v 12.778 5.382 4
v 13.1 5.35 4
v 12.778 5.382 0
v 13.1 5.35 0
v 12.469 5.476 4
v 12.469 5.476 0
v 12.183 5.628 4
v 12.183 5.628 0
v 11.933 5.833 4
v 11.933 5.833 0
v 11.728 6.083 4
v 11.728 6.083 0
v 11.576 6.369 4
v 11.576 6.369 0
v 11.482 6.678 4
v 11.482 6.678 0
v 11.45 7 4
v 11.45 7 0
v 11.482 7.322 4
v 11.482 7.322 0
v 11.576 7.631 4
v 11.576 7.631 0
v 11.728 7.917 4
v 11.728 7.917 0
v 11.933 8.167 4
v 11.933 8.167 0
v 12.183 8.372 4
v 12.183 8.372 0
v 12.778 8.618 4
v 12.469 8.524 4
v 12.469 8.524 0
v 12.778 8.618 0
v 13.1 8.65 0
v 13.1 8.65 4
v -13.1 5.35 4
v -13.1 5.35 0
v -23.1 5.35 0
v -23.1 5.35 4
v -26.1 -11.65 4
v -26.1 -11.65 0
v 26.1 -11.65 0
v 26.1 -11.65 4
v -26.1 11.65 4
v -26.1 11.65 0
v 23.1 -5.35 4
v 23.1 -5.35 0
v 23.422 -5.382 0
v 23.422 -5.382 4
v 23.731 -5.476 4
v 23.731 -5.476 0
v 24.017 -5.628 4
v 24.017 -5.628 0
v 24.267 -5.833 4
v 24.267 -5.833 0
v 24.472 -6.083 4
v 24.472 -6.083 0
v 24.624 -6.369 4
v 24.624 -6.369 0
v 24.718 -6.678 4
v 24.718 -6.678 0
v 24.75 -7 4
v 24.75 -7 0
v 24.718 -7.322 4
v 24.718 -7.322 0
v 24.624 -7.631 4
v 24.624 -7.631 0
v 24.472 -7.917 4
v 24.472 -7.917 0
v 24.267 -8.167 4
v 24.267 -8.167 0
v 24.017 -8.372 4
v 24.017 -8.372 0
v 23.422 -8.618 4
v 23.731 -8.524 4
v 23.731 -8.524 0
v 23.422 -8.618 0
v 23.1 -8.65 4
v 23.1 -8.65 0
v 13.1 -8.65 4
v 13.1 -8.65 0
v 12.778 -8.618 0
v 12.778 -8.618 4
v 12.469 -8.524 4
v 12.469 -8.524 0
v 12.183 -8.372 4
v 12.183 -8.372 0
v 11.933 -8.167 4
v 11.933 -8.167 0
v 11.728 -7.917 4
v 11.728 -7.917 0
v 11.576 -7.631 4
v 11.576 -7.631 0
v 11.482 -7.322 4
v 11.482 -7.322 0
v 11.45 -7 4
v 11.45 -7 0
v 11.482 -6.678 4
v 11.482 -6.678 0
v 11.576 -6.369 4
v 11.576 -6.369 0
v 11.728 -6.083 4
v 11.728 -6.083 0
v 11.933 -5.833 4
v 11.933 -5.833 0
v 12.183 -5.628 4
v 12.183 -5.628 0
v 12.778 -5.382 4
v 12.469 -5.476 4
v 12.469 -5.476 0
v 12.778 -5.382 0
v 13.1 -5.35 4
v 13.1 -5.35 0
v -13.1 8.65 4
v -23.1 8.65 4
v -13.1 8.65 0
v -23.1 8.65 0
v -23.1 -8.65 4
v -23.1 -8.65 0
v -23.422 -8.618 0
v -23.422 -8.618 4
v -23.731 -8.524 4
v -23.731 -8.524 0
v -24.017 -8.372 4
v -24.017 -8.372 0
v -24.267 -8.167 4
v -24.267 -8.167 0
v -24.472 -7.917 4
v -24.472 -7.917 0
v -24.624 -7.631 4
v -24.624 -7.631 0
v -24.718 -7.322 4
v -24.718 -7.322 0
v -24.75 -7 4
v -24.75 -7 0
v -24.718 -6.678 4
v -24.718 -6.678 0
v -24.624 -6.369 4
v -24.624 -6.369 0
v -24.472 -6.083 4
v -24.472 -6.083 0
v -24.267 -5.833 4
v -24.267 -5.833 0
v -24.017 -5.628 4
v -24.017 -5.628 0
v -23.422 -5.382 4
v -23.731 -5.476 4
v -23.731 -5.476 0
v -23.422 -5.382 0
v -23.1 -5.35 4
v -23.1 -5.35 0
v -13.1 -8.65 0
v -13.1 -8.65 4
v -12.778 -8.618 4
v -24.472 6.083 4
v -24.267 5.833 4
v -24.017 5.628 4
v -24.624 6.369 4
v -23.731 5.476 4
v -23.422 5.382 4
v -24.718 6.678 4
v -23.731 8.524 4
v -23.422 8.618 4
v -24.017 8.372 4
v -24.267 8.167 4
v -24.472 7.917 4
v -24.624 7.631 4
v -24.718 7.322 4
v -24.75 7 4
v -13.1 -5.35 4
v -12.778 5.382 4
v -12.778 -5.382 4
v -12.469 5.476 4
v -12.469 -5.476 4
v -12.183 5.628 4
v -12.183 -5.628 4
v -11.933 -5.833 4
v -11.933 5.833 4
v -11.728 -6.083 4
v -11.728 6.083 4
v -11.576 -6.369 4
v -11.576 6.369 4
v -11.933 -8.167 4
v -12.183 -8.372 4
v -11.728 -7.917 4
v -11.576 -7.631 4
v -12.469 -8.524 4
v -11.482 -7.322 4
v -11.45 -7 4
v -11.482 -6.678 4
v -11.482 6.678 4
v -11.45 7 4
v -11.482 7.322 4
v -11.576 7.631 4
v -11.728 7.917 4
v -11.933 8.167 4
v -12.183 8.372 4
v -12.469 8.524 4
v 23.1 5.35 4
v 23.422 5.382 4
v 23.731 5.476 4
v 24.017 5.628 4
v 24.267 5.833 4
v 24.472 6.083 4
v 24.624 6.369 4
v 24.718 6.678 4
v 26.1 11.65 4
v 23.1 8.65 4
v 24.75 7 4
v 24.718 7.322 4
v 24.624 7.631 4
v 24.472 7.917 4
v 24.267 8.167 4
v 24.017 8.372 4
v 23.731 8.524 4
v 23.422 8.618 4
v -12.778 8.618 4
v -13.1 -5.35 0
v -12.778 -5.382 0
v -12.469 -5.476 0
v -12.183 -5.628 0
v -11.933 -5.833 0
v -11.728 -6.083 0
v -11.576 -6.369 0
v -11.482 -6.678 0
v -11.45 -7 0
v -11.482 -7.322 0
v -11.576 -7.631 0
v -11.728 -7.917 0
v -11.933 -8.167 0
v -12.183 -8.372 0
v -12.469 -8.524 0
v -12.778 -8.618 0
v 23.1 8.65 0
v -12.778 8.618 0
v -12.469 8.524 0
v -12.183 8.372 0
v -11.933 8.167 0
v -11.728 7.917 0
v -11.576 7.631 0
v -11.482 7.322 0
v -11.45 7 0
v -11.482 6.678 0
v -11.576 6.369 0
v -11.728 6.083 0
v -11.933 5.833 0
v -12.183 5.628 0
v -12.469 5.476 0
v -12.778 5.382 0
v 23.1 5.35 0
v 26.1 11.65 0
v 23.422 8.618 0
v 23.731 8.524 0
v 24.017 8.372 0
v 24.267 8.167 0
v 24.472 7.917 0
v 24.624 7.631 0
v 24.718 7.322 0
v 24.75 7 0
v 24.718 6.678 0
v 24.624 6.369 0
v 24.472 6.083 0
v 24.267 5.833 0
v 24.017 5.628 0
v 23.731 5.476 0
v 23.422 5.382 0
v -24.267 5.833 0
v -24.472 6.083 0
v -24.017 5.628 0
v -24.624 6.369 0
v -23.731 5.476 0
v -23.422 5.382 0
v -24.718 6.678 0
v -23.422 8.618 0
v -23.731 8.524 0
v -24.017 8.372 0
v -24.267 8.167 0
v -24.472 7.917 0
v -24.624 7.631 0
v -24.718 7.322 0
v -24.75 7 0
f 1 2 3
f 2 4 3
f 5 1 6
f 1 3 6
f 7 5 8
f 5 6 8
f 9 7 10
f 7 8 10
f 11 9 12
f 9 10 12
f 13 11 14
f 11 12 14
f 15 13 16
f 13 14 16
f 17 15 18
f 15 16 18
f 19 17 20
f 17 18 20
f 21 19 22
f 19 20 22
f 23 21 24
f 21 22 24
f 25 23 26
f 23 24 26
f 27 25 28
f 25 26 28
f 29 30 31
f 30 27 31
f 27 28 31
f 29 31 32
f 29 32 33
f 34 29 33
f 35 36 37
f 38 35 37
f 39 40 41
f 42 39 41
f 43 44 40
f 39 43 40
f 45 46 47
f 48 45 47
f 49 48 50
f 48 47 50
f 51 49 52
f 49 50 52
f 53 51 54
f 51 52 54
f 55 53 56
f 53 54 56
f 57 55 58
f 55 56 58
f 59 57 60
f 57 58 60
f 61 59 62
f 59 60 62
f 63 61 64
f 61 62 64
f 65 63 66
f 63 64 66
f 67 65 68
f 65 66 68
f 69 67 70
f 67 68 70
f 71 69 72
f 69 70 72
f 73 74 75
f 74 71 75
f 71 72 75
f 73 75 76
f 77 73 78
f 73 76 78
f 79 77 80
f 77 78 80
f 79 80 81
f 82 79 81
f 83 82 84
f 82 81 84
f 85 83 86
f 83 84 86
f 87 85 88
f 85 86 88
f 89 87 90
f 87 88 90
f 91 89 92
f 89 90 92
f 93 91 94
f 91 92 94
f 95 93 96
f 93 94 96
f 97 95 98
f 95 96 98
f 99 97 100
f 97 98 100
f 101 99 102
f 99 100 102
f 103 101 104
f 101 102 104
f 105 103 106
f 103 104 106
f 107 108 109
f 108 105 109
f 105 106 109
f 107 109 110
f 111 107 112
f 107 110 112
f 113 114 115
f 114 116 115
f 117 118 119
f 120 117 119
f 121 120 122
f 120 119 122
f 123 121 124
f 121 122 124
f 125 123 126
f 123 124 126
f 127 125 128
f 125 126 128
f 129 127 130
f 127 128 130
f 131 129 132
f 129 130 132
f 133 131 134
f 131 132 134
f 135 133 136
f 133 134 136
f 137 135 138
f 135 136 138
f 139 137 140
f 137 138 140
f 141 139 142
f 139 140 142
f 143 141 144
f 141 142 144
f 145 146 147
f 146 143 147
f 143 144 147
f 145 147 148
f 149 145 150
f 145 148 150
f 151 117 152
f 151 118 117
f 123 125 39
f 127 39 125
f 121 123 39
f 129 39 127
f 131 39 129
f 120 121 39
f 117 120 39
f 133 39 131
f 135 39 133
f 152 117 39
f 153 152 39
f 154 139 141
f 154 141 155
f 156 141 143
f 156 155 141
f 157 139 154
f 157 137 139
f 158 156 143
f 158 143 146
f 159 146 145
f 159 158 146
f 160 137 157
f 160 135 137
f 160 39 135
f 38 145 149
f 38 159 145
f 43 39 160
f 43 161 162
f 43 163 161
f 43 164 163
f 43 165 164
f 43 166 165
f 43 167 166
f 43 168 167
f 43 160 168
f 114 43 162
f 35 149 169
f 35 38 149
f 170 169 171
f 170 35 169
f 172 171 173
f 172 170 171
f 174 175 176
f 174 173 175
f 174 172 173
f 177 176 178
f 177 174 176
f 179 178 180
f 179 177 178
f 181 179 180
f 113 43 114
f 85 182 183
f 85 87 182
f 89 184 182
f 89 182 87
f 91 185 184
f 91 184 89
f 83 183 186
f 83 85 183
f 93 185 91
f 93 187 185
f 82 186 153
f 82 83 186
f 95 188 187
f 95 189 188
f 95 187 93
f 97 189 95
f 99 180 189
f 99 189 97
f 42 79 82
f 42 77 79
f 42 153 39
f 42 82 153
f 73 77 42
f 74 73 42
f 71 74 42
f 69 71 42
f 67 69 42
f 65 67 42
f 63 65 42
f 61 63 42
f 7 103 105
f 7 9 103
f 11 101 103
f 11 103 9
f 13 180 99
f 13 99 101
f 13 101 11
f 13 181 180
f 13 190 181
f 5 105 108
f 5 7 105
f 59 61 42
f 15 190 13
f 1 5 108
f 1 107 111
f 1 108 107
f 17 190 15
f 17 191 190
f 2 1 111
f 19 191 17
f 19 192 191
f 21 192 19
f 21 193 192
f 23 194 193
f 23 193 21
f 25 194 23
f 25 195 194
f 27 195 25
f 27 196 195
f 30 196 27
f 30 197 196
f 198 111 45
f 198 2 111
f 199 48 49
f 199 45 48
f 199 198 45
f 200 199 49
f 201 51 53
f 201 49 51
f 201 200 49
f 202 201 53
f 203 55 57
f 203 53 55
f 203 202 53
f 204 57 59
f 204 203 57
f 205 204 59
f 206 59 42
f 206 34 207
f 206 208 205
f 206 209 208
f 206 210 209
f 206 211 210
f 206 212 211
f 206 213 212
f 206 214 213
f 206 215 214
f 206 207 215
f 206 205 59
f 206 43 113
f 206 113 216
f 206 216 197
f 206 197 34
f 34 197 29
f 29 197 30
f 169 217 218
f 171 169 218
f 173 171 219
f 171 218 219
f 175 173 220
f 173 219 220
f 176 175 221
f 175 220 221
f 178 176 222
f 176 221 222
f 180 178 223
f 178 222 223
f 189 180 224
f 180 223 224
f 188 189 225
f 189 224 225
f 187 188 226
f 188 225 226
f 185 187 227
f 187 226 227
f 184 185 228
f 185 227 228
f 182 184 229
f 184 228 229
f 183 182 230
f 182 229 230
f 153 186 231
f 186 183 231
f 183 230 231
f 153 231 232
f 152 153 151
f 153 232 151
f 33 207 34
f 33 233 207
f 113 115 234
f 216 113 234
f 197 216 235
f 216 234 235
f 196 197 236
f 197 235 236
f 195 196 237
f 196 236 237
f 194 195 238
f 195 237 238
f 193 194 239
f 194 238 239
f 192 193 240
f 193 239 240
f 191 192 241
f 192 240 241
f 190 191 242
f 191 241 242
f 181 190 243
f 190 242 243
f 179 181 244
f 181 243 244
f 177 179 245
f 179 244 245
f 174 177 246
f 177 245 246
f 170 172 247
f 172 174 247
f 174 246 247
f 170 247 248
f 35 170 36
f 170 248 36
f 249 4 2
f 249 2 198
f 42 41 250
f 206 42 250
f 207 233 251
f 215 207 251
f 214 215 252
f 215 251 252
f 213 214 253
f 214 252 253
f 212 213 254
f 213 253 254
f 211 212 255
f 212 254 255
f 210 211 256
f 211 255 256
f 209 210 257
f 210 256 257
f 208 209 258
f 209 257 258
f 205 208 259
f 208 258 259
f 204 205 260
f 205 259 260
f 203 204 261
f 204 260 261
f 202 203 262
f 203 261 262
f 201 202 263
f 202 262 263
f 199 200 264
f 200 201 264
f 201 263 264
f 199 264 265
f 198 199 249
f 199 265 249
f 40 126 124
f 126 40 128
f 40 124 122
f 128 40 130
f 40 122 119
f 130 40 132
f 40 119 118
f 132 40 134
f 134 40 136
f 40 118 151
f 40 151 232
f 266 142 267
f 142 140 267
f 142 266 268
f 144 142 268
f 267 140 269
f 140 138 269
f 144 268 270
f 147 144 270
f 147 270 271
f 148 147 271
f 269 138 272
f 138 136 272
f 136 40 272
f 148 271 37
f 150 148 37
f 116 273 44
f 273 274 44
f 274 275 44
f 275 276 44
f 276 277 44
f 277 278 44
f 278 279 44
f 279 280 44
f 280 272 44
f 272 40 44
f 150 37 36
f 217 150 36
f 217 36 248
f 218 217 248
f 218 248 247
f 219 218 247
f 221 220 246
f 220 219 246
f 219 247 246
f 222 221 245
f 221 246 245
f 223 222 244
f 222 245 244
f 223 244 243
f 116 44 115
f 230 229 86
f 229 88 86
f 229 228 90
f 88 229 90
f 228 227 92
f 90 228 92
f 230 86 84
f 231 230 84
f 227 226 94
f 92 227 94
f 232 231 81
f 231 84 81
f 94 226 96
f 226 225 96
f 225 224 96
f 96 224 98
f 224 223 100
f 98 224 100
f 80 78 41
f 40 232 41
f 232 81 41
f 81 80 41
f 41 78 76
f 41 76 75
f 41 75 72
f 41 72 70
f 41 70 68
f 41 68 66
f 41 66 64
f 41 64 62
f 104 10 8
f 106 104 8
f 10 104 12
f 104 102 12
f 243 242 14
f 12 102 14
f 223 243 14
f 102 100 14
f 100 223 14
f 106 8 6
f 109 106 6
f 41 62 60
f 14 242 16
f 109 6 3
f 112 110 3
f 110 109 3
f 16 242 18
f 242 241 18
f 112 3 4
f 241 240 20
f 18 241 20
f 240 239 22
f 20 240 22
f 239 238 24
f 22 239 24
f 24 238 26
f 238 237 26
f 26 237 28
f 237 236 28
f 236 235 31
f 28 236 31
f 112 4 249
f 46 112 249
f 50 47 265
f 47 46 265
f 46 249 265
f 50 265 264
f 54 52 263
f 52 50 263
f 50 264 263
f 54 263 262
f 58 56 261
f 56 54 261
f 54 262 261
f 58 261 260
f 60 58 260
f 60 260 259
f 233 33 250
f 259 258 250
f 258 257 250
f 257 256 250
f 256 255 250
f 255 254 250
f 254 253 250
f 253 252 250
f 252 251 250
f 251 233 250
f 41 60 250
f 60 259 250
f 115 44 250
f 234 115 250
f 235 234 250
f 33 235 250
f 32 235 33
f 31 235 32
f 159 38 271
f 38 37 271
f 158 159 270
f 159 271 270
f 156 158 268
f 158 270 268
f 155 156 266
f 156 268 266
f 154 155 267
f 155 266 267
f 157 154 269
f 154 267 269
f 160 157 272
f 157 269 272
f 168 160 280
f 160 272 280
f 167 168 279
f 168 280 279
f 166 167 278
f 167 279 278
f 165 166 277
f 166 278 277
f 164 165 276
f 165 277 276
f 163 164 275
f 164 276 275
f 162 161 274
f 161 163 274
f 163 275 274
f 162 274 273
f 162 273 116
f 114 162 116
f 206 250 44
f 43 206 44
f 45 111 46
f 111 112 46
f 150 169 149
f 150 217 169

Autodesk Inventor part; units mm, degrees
ref_plane "YZ Plane" through (0, 0, 0) normal (1, 0, 0) x (0, 1, 0)
ref_plane "XZ Plane" through (0, 0, 0) normal (0, 1, 0) x (-1, 0, 0)
ref_plane "XY Plane" through (0, 0, 0) normal (0, 0, 1) x (1, 0, 0)
sketch "Эскиз1" plane through (0, 0, 0) normal (0, 0, 1) x (1, 0, 0)
  line L0 (-13.1, -7) -> (13.1, -7) construction
  line L1 (13.1, -7) -> (13.1, 7) construction
  line L2 (13.1, 7) -> (-13.1, 7) construction
  line L3 (-13.1, 7) -> (-13.1, -7) construction
  line L4 (-13.1, -7) -> (13.1, 7) construction
  line L5 (13.1, -7) -> (-13.1, 7) construction
  line L6 (13.1, 7) -> (23.1, 7) construction
  line L7 (13.1, 5.35) -> (23.1, 5.35)
  line L8 (23.1, 8.65) -> (13.1, 8.65)
  arc A0 (13.1, 8.65) -> (13.1, 5.35) centre (13.1, 7) ccw
  arc A1 (23.1, 5.35) -> (23.1, 8.65) centre (23.1, 7) ccw
  line L9 (-26.1, -11.65) -> (26.1, -11.65)
  line L10 (26.1, -11.65) -> (26.1, 11.65)
  line L11 (26.1, 11.65) -> (-26.1, 11.65)
  line L12 (-26.1, 11.65) -> (-26.1, -11.65)
  line L13 (-26.1, -11.65) -> (26.1, 11.65) construction
  line L14 (26.1, -11.65) -> (-26.1, 11.65) construction
  line L15 (0, 0) -> (0, -11.65)
  line L16 (0, 0) -> (26.1, 0)
  line L17 (13.1, -5.35) -> (23.1, -5.35)
  line L18 (23.1, -8.65) -> (13.1, -8.65)
  arc A2 (13.1, -5.35) -> (13.1, -8.65) centre (13.1, -7) ccw
  arc A3 (23.1, -8.65) -> (23.1, -5.35) centre (23.1, -7) ccw
  line L19 (-13.1, 7) -> (-23.1, 7) construction
  line L20 (-13.1, 5.35) -> (-23.1, 5.35)
  line L21 (-23.1, 8.65) -> (-13.1, 8.65)
  arc A4 (-13.1, 5.35) -> (-13.1, 8.65) centre (-13.1, 7) ccw
  arc A5 (-23.1, 8.65) -> (-23.1, 5.35) centre (-23.1, 7) ccw
  line L22 (-13.1, -5.35) -> (-23.1, -5.35)
  arc A6 (-13.1, -8.65) -> (-13.1, -5.35) centre (-13.1, -7) ccw
  line L23 (-23.1, -8.65) -> (-13.1, -8.65)
  arc A7 (-23.1, -5.35) -> (-23.1, -8.65) centre (-23.1, -7) ccw
  point P0 (18.1, 7)
  point P1 (-18.1, 7)
  dimension "d0" = 14
  dimension "d1" = 26.2
  dimension "d2" = 10
  dimension "d3" = 3.3
  dimension "d4" = 3
  dimension "d5" = 3
extrude "Выдавливание1" add sketch "Эскиз1" along normal blind 4
properties part number "стена_каретка"
